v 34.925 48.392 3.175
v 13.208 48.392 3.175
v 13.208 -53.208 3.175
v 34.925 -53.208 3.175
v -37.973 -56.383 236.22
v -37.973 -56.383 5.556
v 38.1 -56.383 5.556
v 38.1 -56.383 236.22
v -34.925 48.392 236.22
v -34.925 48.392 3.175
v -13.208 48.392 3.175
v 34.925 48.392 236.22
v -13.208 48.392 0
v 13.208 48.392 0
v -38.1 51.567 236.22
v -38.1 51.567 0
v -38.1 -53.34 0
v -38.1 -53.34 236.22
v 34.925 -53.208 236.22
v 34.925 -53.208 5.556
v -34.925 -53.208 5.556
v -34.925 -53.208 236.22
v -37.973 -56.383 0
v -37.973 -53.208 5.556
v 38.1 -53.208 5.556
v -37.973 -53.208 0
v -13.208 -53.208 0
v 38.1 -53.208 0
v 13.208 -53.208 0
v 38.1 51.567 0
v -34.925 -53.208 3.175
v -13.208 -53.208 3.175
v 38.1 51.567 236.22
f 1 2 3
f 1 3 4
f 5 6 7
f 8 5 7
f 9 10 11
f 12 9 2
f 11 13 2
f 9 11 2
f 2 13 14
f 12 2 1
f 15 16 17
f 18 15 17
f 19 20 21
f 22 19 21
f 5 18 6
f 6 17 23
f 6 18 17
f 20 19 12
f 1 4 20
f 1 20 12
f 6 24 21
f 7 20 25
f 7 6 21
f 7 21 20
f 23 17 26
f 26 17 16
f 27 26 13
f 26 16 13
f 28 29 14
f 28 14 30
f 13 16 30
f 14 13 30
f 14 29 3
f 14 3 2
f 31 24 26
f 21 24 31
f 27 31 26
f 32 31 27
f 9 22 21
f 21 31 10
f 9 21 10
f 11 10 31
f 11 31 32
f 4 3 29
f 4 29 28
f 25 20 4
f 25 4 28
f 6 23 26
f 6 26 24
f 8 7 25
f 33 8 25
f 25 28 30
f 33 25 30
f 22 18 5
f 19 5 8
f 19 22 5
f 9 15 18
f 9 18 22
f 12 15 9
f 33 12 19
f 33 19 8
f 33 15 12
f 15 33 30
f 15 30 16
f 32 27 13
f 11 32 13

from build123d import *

# Parameters (mm, degrees)
F0_W     = 3.175
F0_H     = 101.6
F1_DEPTH = 228.6
F2_DEPTH = 236.22
F0_W_2   = 21.717
F3_DEPTH = 3.175
F4_W     = 76.0733831866
F4_H     = 5.55625
F5_DEPTH = 3.175


# Not quite as in the source:
# - the program builds the solid bodies; features that only make, move or delete a surface that nothing else refers to are left out


with BuildPart() as f1:
    # F0 (on Top) → F1 (new body)
    with BuildSketch(Plane.XY):
        with Locations((36.5125, -2.4078887083)):
            Rectangle(F0_W, F0_H)
    extrude(amount=F1_DEPTH)

    # F0 (on Top) → F2 (join)
    with BuildSketch(Plane.XY):
        Polygon((-34.925, 48.3921112917), (-13.208, 48.3921112917), (13.208, 48.3921112917), (34.925, 48.3921112917), (38.1, 48.3921112917), (38.1, 51.5671112917), (-38.1, 51.5671112917), (-38.1, 48.3921112917), align=None)
        Polygon((-34.925, -53.2078887083), (-34.925, 48.3921112917), (-38.1, 48.3921112917), (-38.1, -53.3400028944), align=None)
        Polygon((13.208, -53.2078887083), (-13.208, -53.2078887083), (-34.925, -53.2078887083), (-38.1, -53.3400028944), (-37.9733831866, -56.3828887083), (38.1, -56.3828887083), (38.1, -53.2078887083), (34.925, -53.2078887083), align=None)
        with Locations((36.5125, -2.4078887083)):
            Rectangle(F0_W, F0_H)
    extrude(amount=F2_DEPTH)

    # F0 (on Top) → F3 (join)
    with BuildSketch(Plane.XY):
        with Locations((-24.0665, -2.4078887083)):
            Rectangle(F0_W_2, F0_H)
        with Locations((24.0665, -2.4078887083)):
            Rectangle(F0_W_2, F0_H)
    extrude(amount=F3_DEPTH)

    # F4 (on face) → F5 (cut)
    with BuildSketch(Plane.XZ.offset(56.3828887083)):
        with Locations((0.0633084067, 2.778125)):
            Rectangle(F4_W, F4_H)
    extrude(amount=-F5_DEPTH, mode=Mode.SUBTRACT)


solid = f1.part
